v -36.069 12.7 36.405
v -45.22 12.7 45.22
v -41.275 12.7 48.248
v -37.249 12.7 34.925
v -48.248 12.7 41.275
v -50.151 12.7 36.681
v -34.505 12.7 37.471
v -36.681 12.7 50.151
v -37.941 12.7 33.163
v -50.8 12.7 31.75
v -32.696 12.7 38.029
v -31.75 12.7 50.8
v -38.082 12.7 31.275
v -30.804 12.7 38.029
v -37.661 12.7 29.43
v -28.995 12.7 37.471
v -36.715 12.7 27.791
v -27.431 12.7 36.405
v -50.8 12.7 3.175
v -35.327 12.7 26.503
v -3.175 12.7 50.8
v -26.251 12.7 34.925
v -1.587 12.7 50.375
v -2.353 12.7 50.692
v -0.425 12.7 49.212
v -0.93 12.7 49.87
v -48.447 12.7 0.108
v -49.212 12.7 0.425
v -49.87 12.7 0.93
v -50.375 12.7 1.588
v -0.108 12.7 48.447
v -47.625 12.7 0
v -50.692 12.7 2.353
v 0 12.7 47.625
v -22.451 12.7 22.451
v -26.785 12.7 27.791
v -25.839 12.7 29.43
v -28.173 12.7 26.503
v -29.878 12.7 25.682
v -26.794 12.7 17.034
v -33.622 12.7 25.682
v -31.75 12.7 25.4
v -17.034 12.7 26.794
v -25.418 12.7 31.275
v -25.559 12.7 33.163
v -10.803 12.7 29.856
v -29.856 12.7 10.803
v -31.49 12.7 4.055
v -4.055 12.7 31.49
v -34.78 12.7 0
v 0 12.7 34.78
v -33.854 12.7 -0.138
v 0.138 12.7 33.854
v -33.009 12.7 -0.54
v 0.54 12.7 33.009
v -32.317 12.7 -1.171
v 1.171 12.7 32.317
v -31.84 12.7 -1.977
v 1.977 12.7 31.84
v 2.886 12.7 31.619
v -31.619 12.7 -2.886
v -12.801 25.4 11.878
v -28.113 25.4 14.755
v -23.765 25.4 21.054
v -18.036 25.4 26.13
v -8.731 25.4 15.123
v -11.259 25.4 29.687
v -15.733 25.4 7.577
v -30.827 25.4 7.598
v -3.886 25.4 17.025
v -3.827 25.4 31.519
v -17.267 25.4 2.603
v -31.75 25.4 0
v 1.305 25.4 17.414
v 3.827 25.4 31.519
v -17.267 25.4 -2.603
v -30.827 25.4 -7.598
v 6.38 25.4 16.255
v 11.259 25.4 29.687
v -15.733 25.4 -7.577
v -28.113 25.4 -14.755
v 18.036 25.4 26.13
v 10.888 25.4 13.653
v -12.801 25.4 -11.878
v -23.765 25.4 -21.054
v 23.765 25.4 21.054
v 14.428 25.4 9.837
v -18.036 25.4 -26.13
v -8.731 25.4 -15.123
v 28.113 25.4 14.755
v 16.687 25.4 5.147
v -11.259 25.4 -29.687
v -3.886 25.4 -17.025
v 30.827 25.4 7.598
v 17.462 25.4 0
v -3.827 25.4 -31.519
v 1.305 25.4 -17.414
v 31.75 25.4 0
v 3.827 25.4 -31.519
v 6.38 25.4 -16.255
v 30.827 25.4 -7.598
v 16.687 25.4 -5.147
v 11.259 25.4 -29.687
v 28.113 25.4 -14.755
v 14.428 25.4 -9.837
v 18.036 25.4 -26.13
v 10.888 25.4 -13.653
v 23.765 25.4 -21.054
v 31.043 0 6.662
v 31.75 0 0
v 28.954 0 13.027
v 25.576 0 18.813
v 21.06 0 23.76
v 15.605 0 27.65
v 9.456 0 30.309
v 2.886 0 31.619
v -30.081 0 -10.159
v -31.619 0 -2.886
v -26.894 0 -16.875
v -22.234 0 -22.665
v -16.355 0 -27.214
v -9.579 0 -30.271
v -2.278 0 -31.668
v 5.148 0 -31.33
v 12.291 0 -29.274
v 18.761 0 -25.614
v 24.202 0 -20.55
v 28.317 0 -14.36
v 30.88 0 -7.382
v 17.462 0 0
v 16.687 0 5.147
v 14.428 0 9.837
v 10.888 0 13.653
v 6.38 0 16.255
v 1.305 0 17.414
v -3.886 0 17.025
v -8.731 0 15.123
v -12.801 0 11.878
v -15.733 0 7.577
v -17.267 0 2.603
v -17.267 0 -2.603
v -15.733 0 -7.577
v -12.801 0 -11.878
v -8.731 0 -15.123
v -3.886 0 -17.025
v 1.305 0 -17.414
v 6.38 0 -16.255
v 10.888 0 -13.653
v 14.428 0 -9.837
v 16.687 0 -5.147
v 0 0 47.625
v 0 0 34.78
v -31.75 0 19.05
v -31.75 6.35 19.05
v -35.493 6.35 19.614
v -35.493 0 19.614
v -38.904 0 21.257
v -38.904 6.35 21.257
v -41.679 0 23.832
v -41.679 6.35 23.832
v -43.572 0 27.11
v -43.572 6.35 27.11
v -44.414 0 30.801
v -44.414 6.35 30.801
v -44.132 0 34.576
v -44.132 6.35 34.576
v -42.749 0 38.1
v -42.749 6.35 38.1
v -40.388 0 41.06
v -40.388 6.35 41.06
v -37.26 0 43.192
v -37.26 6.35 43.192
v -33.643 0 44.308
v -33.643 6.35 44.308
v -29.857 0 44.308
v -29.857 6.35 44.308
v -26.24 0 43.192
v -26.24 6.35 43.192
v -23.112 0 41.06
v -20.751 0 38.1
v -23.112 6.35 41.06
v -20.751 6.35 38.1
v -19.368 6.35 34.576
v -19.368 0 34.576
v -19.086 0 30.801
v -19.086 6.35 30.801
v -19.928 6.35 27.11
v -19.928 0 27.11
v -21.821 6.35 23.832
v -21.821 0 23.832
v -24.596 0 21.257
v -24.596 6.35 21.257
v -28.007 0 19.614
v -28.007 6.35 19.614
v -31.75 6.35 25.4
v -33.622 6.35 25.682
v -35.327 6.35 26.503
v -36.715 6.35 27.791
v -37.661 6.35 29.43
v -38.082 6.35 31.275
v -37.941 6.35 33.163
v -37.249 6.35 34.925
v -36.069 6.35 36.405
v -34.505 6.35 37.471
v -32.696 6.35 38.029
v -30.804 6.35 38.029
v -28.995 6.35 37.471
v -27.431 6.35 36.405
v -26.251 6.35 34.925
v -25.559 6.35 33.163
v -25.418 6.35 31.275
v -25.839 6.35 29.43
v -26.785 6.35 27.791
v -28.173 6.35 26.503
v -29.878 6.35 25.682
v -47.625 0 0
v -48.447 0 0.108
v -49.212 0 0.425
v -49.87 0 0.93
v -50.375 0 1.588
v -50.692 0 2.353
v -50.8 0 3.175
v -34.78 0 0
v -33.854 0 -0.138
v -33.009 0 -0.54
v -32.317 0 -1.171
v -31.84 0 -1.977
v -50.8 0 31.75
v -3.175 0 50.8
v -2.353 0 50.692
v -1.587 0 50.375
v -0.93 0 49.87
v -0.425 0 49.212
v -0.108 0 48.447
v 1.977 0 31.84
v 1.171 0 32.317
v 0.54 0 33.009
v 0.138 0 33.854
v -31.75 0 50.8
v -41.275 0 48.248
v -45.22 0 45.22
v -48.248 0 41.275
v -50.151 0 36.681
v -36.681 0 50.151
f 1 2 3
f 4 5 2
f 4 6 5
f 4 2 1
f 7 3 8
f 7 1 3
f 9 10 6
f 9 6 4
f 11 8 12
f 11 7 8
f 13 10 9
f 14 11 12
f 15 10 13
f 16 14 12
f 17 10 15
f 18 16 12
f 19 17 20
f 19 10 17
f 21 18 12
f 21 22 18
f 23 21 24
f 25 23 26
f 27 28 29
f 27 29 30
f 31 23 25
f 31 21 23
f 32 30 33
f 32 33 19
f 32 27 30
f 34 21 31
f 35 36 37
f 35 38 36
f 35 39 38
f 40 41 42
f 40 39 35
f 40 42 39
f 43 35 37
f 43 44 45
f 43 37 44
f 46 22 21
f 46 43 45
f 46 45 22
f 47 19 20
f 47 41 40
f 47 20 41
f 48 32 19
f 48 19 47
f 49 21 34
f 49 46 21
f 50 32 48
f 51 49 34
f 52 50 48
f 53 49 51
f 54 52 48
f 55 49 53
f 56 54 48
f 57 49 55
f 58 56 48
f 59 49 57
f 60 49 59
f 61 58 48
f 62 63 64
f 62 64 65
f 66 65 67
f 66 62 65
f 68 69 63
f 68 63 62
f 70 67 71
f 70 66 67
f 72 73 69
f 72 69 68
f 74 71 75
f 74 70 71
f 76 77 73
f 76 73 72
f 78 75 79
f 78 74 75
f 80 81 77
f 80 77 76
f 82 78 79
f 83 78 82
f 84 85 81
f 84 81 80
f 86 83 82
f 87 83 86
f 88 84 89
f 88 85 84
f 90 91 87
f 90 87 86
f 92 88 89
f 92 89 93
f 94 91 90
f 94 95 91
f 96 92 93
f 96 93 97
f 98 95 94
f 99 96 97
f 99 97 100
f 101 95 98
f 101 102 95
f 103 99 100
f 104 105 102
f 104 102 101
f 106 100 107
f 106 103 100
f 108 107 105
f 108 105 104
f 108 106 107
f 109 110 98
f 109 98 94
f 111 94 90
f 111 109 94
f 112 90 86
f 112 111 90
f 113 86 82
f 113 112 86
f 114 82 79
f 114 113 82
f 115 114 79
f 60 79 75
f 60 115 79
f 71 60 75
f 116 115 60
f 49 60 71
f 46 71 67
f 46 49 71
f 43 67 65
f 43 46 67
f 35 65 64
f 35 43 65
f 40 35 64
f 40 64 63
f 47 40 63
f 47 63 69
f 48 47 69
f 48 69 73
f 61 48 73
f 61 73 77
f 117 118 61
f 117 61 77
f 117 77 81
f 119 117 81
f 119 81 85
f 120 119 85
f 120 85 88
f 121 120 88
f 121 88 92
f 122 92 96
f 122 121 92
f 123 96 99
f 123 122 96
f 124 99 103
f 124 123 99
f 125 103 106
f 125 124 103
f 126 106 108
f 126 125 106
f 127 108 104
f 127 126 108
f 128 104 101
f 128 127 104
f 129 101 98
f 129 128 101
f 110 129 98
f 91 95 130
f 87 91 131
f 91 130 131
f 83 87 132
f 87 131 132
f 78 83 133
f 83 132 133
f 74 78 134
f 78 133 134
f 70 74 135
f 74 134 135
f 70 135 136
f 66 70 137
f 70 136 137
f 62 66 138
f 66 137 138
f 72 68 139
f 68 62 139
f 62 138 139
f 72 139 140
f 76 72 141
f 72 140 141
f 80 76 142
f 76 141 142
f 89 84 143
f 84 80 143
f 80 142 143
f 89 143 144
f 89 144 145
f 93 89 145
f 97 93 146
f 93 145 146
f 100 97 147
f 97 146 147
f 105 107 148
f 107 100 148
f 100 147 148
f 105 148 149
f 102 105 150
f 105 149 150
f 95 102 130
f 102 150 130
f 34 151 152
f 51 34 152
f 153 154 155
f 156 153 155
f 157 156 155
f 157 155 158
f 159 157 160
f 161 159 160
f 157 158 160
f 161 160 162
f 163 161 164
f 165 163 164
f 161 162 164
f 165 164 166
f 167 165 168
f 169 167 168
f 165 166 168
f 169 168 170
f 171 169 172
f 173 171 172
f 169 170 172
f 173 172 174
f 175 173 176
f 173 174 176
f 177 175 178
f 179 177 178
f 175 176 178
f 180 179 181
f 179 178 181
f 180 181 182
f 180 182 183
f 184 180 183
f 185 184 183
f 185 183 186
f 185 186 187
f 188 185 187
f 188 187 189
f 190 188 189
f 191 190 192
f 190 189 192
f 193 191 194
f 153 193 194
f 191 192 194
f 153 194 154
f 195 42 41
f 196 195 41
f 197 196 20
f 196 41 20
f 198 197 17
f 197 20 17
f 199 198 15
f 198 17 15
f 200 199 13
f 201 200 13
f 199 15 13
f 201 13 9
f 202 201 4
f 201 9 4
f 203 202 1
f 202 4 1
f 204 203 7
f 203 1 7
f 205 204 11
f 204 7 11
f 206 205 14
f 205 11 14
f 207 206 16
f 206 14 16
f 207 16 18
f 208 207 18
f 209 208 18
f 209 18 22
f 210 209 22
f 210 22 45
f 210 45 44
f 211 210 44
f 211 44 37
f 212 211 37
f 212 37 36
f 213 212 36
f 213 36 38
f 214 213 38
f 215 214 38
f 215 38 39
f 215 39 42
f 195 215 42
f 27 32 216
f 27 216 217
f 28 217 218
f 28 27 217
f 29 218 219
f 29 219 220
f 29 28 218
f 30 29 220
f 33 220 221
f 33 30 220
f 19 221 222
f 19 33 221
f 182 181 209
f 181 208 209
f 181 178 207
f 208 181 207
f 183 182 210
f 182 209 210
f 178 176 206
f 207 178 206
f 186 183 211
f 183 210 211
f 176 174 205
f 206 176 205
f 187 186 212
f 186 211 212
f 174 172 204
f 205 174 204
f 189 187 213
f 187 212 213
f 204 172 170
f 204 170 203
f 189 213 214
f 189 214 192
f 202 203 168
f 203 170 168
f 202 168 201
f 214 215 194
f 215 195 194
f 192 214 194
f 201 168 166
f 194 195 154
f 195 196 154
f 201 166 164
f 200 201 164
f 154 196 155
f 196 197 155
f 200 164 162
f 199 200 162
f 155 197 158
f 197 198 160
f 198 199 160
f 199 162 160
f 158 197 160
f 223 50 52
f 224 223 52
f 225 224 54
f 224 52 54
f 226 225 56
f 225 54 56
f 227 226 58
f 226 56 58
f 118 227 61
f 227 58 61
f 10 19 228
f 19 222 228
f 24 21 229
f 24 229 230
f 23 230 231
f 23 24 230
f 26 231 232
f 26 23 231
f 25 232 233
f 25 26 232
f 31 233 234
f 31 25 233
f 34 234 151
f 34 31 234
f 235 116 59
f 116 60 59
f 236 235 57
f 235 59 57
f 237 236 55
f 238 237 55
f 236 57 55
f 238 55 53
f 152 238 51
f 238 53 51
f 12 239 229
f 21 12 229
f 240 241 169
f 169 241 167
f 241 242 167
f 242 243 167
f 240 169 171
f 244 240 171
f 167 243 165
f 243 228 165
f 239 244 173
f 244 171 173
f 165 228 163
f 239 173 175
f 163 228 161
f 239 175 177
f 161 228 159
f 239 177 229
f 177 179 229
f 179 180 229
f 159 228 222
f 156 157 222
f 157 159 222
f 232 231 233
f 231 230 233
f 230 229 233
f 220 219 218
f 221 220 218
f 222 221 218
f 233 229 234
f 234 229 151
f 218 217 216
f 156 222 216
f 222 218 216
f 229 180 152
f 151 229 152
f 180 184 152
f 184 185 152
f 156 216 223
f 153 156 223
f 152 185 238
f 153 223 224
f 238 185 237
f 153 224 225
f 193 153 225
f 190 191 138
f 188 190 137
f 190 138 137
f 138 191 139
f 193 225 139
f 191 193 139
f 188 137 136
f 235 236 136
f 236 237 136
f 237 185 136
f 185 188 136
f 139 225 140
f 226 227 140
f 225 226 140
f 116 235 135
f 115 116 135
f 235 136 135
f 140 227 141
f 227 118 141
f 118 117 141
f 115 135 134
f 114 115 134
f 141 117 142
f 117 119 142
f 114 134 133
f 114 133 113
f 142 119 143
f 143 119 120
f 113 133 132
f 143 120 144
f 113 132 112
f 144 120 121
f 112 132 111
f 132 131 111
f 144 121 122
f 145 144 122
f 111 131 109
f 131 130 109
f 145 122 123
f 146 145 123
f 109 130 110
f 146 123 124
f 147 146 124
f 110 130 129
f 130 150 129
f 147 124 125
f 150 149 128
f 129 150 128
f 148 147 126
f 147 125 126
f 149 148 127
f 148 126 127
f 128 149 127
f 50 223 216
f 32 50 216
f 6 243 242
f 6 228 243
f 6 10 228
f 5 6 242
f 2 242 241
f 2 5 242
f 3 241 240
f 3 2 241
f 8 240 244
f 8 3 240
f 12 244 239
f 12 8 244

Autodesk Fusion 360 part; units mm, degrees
sketch "Sketch1" plane through (0, 0, 0) normal (0, 1, 0) x (1, 0, 0)
  circle A0 centre (0, 0) radius 17.4625
  circle A1 centre (0, 0) radius 31.75
  line L0 (-50.8, -50.8) -> (0, -50.8)
  line L1 (0, -50.8) -> (0, 0)
  line L2 (0, 0) -> (-50.8, 0)
  line L3 (-50.8, 0) -> (-50.8, -50.8)
  circle A2 centre (-31.75, -31.75) radius 1.27
  dimension "d1" = 34.925
  dimension "d2" = 63.5
  dimension "d3" = 50.8
  dimension "d4" = 50.8
  dimension "d5" = 31.75
  dimension "d6" = 31.75
  dimension "d7" = 2.54
extrude "Extrude1" add sketch "Sketch1" along normal blind 25.4 contours A0 A1 L1 L2 | A0 A1 L1 L2
extrude "Extrude2" add sketch "Sketch1" along normal blind 12.7 contours A1 L0 L1 L2 L3
fillet "Fillet1" radius 19.05 1 edges at (-50.8, 6.35, 50.8)
fillet "Fillet1" radius 3.175 4 edges at (0, 6.35, 50.8) (0, 6.35, 31.75) (-50.8, 6.35, 0) (-31.75, 6.35, 0)
hole "Hole1" at (-31.75, 0, 31.75) direction (0, 1, 0) diameter 12.7 depth 25.4 tip angle 118 counterbore diameter 25.4 counterbore depth 6.35
equation "d2 = ( 1.25 * 2 ) * 1 in"
